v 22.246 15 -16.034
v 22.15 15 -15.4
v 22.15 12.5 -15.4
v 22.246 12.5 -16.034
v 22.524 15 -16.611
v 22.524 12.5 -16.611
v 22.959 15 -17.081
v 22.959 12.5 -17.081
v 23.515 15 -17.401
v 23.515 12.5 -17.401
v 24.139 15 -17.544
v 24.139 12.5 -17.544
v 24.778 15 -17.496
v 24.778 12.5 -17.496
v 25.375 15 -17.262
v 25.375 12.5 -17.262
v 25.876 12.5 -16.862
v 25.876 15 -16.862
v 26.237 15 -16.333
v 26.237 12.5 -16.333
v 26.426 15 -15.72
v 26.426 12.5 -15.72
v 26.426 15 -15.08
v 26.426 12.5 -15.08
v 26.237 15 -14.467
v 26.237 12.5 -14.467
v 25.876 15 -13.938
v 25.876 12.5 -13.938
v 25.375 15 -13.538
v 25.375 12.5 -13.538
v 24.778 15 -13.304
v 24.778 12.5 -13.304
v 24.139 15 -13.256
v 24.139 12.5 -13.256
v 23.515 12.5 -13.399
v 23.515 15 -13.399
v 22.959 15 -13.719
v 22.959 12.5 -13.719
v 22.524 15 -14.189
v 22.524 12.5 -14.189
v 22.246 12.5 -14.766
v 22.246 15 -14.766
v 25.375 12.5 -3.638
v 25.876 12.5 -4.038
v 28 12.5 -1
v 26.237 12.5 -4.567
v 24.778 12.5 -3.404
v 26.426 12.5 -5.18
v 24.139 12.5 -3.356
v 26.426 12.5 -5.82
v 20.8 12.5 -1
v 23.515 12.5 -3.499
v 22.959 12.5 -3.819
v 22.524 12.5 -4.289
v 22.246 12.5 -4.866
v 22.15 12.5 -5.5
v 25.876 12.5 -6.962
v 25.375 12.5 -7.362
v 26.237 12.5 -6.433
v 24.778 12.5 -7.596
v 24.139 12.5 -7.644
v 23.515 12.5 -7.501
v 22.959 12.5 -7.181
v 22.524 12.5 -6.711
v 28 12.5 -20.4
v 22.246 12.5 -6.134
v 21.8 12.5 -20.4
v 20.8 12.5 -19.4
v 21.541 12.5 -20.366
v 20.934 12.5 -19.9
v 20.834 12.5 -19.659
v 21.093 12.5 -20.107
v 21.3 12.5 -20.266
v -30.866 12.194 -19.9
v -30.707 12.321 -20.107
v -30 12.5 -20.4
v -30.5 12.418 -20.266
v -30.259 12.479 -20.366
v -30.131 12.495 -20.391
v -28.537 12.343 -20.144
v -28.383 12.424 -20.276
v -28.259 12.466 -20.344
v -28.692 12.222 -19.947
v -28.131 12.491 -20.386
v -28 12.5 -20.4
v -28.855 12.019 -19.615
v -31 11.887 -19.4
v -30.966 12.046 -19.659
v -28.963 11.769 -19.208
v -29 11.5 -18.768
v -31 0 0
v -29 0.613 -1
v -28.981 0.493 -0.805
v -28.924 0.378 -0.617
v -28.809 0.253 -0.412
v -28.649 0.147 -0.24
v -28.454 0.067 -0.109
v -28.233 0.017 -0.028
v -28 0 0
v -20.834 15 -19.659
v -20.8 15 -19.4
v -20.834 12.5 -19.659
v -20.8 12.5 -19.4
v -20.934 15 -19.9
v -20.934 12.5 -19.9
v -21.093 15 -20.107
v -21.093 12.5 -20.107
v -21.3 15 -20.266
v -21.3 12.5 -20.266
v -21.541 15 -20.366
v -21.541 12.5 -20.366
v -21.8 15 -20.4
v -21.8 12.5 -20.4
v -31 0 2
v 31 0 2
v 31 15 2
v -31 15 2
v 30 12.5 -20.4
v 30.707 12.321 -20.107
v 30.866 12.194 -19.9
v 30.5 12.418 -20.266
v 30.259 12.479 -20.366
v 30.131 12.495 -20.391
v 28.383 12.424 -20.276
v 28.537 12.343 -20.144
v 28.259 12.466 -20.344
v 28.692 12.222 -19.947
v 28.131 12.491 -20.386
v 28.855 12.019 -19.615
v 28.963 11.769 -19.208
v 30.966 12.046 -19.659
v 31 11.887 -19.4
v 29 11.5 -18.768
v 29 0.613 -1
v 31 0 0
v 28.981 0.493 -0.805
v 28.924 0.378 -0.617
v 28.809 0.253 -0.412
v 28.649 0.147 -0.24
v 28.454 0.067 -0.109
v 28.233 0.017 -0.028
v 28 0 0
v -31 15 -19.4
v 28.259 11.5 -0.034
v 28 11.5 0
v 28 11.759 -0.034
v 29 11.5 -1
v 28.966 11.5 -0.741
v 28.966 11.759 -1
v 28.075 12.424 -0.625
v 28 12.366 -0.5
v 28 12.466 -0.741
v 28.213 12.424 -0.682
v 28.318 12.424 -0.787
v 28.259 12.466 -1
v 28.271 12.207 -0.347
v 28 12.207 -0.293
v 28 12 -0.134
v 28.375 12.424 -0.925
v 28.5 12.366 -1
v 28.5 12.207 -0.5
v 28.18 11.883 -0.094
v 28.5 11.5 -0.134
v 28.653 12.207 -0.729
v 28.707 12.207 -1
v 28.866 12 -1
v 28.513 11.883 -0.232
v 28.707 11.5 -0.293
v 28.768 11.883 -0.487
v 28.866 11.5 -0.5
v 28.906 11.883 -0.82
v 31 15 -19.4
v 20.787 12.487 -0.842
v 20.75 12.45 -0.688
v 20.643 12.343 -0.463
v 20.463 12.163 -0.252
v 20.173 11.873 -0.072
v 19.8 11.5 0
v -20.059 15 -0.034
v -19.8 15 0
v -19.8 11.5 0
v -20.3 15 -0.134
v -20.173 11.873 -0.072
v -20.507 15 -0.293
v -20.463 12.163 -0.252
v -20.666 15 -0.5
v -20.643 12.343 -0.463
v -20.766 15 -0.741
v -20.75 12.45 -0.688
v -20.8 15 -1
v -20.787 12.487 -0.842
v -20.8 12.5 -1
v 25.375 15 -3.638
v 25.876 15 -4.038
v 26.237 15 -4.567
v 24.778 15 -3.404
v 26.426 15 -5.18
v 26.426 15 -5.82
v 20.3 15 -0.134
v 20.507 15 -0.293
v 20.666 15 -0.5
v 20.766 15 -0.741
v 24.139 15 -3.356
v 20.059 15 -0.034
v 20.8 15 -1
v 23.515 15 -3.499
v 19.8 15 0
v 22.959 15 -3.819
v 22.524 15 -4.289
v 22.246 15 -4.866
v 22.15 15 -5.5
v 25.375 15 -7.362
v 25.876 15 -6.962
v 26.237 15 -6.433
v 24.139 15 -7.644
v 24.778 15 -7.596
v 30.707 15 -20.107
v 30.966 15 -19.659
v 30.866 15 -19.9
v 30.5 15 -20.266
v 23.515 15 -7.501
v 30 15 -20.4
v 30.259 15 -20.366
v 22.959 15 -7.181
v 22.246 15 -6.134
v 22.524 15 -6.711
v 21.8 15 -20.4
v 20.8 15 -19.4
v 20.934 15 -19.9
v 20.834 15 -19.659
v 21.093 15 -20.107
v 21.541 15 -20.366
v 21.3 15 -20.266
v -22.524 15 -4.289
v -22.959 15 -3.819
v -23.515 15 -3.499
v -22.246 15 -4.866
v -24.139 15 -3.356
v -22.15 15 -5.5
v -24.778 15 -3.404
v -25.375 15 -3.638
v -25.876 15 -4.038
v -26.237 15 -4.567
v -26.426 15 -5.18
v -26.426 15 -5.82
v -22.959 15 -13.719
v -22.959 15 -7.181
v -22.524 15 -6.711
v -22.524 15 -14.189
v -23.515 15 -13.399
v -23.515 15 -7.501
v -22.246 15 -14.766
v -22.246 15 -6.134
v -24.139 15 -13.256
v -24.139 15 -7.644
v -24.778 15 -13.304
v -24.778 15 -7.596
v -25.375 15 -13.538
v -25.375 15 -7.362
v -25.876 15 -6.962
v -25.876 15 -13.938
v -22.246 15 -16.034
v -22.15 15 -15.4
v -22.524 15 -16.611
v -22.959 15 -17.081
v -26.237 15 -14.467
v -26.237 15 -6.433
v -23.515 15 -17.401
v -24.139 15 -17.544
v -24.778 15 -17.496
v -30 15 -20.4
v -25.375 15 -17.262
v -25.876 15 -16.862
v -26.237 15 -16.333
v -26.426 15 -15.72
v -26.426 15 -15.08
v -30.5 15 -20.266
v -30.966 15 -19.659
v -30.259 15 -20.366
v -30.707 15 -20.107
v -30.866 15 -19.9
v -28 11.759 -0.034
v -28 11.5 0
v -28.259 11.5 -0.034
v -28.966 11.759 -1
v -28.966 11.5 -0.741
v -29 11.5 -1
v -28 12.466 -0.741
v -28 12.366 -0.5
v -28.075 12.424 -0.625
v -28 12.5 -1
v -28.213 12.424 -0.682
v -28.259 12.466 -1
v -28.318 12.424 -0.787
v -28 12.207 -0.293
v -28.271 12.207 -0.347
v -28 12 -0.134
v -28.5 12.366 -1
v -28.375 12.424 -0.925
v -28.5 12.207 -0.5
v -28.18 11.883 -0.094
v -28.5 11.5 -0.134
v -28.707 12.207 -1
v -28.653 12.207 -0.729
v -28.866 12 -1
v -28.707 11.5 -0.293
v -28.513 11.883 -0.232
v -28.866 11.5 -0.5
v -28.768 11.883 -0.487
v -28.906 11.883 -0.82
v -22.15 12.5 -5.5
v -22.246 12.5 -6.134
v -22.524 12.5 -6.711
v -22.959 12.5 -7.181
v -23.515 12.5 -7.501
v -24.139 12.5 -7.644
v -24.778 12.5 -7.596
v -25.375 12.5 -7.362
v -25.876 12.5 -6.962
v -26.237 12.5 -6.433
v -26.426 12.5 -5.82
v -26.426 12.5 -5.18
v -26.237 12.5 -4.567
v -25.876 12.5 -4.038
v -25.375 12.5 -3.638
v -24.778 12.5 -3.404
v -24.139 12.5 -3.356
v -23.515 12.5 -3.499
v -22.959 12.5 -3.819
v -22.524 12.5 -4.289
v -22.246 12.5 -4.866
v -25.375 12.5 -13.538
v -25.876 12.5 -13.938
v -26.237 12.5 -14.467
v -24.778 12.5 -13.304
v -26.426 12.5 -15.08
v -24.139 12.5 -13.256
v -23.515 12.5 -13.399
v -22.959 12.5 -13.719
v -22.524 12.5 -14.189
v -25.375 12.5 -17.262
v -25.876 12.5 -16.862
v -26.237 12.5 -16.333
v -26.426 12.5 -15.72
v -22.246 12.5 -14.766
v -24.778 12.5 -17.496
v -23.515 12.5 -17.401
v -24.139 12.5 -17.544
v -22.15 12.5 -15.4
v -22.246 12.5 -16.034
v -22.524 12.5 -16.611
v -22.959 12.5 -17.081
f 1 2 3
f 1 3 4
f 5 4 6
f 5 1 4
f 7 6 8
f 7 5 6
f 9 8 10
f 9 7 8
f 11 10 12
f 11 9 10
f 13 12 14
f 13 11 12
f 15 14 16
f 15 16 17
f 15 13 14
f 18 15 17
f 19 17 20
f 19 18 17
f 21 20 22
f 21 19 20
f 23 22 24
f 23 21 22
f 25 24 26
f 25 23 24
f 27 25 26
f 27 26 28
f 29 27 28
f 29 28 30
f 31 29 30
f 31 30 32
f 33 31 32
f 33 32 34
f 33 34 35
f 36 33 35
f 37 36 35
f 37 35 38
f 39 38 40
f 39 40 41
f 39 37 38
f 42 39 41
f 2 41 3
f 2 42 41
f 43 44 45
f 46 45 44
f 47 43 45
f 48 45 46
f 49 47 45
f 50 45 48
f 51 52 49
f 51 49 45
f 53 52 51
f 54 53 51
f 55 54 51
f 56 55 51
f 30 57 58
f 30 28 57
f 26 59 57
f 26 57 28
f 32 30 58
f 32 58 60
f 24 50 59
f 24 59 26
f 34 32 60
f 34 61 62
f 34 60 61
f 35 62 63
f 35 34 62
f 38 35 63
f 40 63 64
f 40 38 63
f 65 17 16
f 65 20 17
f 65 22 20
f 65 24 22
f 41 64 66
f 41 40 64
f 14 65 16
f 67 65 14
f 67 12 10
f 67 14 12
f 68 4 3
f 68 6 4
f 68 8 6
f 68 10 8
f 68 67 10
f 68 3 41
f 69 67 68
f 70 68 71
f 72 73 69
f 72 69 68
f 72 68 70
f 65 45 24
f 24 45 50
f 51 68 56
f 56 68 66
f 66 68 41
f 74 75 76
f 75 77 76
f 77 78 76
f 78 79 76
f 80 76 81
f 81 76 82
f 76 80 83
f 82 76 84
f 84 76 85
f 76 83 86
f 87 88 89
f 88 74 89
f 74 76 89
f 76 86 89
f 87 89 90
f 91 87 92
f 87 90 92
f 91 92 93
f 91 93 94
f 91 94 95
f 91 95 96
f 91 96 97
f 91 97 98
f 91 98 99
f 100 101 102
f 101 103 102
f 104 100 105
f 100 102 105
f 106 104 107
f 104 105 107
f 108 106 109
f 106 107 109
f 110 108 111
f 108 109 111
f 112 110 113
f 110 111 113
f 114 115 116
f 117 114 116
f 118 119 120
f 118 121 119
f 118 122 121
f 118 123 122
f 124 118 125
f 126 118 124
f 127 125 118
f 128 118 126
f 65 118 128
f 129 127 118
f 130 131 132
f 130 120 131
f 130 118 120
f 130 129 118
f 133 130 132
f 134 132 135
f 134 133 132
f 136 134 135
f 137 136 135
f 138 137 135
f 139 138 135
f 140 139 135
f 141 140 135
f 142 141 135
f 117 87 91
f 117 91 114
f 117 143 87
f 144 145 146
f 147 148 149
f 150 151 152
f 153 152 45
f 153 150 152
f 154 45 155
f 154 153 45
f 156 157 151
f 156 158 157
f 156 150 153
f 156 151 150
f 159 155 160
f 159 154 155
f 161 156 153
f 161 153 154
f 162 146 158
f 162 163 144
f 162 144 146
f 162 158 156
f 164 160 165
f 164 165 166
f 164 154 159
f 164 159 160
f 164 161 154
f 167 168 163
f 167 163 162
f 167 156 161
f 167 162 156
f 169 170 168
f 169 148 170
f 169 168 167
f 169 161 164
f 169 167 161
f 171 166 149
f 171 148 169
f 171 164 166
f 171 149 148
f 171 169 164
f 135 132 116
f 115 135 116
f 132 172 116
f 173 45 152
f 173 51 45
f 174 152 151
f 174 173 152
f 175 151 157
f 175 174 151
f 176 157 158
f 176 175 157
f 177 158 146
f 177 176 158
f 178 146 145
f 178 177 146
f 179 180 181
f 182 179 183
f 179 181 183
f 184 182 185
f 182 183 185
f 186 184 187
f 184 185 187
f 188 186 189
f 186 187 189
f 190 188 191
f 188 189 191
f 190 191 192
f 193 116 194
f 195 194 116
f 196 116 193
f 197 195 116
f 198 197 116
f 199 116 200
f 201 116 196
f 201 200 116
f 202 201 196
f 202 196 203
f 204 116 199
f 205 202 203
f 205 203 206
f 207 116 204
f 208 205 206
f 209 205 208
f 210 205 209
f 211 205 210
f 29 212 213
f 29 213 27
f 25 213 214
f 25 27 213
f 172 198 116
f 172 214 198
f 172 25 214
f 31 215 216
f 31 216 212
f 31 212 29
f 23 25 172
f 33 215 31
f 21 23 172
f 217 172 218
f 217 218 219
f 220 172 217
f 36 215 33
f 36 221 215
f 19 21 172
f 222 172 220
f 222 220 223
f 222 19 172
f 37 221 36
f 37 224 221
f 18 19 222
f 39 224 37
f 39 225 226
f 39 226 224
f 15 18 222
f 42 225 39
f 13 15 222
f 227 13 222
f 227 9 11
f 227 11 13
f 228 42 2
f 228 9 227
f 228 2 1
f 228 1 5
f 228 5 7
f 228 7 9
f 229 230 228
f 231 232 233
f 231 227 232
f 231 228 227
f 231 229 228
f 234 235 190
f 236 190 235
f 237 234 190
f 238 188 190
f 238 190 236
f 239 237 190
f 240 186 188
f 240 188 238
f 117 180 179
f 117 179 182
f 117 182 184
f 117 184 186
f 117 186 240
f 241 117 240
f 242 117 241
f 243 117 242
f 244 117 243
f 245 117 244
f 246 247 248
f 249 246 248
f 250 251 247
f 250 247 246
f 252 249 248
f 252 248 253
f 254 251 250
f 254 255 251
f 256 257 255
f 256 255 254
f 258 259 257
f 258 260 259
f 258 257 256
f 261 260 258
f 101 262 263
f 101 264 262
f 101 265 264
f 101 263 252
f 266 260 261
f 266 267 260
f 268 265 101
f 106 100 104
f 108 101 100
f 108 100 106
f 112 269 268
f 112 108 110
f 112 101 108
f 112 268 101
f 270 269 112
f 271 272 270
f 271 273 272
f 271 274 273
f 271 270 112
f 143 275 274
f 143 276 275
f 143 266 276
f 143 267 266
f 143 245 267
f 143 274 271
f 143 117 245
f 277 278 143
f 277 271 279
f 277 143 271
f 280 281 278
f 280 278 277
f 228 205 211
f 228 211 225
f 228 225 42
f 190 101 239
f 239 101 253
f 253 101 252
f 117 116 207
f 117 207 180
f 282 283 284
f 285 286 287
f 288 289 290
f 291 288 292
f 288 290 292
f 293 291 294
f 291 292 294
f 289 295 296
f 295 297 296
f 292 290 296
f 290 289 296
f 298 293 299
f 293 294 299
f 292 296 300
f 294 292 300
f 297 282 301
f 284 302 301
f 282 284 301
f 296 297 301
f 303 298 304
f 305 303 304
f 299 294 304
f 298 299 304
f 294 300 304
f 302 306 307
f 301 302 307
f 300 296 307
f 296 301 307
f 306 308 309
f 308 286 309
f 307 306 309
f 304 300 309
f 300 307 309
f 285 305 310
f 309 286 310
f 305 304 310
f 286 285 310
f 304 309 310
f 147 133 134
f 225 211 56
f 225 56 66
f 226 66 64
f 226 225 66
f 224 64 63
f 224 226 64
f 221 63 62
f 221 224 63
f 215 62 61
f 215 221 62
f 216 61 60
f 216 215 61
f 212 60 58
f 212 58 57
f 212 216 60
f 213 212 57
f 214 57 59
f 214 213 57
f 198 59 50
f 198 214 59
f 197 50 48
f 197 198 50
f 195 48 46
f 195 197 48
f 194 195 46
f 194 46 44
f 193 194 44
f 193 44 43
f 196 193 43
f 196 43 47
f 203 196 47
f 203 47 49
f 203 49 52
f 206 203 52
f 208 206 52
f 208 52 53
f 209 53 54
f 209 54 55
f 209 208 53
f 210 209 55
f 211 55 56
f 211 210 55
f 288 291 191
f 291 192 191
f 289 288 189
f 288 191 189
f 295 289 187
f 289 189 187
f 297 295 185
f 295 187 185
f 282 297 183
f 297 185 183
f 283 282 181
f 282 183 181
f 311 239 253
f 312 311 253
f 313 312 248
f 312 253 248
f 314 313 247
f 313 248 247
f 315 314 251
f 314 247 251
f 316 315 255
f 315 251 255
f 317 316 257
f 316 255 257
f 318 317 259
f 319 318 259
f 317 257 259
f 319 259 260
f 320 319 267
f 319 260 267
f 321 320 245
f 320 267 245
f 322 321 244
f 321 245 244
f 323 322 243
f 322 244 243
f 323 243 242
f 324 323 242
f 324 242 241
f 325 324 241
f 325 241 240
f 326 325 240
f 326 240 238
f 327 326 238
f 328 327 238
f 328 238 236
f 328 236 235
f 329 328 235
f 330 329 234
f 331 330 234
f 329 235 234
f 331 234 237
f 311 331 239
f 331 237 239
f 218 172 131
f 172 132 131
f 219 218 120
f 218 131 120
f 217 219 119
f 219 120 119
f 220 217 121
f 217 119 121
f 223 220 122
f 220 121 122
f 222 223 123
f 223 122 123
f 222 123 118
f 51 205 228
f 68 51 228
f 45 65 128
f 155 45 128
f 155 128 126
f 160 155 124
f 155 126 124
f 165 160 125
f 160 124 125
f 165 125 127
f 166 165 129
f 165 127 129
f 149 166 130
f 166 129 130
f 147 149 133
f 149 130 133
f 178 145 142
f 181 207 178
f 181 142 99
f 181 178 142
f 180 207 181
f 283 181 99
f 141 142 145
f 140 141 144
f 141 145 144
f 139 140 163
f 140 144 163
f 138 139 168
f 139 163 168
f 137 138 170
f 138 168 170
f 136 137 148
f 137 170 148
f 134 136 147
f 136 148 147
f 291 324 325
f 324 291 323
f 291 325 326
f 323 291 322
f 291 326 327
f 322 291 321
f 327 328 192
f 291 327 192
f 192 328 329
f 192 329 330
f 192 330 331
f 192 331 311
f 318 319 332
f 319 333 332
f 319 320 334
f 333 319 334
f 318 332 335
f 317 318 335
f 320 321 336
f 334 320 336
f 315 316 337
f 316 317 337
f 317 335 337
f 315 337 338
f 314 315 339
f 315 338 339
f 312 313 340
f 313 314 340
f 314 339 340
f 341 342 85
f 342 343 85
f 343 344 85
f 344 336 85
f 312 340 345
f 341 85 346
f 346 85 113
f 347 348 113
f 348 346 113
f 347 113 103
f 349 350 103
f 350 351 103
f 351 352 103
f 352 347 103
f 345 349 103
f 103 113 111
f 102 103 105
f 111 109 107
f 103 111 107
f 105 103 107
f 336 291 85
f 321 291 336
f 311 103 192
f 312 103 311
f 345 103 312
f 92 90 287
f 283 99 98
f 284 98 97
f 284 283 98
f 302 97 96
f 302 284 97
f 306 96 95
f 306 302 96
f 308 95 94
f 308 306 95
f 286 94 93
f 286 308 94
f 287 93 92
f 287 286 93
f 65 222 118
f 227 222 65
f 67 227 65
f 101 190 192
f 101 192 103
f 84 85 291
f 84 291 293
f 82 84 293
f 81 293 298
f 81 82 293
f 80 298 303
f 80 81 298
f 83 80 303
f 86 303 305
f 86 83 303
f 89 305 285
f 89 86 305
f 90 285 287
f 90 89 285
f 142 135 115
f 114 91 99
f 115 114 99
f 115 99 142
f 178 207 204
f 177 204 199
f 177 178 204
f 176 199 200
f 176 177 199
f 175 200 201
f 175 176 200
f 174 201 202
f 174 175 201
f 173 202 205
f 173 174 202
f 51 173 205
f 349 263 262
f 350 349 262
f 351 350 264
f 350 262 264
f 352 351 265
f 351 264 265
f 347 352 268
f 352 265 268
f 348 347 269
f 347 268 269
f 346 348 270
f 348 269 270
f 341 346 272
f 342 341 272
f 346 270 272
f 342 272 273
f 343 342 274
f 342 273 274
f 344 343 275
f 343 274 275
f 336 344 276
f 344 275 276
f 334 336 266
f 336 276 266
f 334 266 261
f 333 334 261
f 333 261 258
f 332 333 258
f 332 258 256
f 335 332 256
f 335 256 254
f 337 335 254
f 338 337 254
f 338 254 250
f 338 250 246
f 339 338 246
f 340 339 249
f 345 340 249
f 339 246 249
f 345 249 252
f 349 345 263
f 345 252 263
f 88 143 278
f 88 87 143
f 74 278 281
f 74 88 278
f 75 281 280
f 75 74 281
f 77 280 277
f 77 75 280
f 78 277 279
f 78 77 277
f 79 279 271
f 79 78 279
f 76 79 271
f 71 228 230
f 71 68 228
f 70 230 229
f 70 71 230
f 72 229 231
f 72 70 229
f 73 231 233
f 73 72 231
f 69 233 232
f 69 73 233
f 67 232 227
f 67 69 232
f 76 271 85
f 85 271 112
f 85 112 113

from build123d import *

# Parameters (mm, degrees)
SKETCH_1_W             = 29
SKETCH_1_H             = 15
EXTRUDE_1_DEPTH        = 2
SKETCH_2_W             = 8.2
SKETCH_2_H             = 20.4
SKETCH_2_R             = 2.15
EXTRUDE_2_DEPTH        = 2.5
EXTRUDE_3_DEPTH        = 2
FILLET_1_R             = 1
FILLET_1_OF_MIRROR_2_R = 1


with BuildPart() as part:
    # 草图1 → 凸台-拉伸1 (new body)
    with BuildSketch(Plane.XY):
        with Locations((-14.5, 7.5)):
            Rectangle(SKETCH_1_W, SKETCH_1_H)
    extrude_1 = extrude(amount=EXTRUDE_1_DEPTH)

    # 草图2 → 凸台-拉伸2 (add)
    with BuildSketch(Plane(origin=(0, 15, 0), x_dir=(1, 0, 0), z_dir=(0, 1, 0))):
        with Locations((-24.9, 10.2)):
            Rectangle(SKETCH_2_W, SKETCH_2_H)
        with Locations((-24.3, 5.5)):
            Circle(SKETCH_2_R, mode=Mode.SUBTRACT)
        with Locations((-24.3, 15.4)):
            Circle(SKETCH_2_R, mode=Mode.SUBTRACT)
    extrude_2 = extrude(amount=-EXTRUDE_2_DEPTH)

    # 草图3 → 凸台-拉伸3 (add)
    with BuildSketch(Plane.ZY.offset(29)):
        Polygon((-20.4, 12.5), (0, 0), (0, 12.5), align=None)
        Polygon((2, 0), (2, 15), (-20.4, 15), (-20.4, 12.5), (0, 12.5), (0, 0), align=None)
    extrude_3 = extrude(amount=EXTRUDE_3_DEPTH)

    # 圆角1
    fillet_1_edges = [part.edges().sort_by_distance(p)[0] for p in [
        (-29, 6.25, 0),
        (-20.8, 13.75, 0),
        (-20.8, 13.75, -20.4),
        (-24.9, 12.5, 0),
        (-29, 12.5, -10.2),
        (-31, 13.75, -20.4),
    ]]
    fillet(fillet_1_edges, radius=FILLET_1_R)

    # 镜向2: 凸台-拉伸1, 凸台-拉伸2, 凸台-拉伸3 across plane
    add(extrude_1.mirror(Plane(origin=(0, 0, 2), x_dir=(0, 0, 1), z_dir=(-1, 0, 0))))
    add(extrude_2.mirror(Plane(origin=(0, 0, 2), x_dir=(0, 0, 1), z_dir=(-1, 0, 0))))
    add(extrude_3.mirror(Plane(origin=(0, 0, 2), x_dir=(0, 0, 1), z_dir=(-1, 0, 0))))

    # 圆角1 of 镜向2
    fillet_1_of_mirror_2_edges = [part.edges().sort_by_distance(p)[0] for p in [
        (29, 6.25, 0),
        (20.8, 13.75, 0),
        (20.8, 13.75, -20.4),
        (24.9, 12.5, 0),
        (29, 12.5, -10.2),
        (31, 13.75, -20.4),
    ]]
    fillet(fillet_1_of_mirror_2_edges, radius=FILLET_1_OF_MIRROR_2_R)


solid = part.part
